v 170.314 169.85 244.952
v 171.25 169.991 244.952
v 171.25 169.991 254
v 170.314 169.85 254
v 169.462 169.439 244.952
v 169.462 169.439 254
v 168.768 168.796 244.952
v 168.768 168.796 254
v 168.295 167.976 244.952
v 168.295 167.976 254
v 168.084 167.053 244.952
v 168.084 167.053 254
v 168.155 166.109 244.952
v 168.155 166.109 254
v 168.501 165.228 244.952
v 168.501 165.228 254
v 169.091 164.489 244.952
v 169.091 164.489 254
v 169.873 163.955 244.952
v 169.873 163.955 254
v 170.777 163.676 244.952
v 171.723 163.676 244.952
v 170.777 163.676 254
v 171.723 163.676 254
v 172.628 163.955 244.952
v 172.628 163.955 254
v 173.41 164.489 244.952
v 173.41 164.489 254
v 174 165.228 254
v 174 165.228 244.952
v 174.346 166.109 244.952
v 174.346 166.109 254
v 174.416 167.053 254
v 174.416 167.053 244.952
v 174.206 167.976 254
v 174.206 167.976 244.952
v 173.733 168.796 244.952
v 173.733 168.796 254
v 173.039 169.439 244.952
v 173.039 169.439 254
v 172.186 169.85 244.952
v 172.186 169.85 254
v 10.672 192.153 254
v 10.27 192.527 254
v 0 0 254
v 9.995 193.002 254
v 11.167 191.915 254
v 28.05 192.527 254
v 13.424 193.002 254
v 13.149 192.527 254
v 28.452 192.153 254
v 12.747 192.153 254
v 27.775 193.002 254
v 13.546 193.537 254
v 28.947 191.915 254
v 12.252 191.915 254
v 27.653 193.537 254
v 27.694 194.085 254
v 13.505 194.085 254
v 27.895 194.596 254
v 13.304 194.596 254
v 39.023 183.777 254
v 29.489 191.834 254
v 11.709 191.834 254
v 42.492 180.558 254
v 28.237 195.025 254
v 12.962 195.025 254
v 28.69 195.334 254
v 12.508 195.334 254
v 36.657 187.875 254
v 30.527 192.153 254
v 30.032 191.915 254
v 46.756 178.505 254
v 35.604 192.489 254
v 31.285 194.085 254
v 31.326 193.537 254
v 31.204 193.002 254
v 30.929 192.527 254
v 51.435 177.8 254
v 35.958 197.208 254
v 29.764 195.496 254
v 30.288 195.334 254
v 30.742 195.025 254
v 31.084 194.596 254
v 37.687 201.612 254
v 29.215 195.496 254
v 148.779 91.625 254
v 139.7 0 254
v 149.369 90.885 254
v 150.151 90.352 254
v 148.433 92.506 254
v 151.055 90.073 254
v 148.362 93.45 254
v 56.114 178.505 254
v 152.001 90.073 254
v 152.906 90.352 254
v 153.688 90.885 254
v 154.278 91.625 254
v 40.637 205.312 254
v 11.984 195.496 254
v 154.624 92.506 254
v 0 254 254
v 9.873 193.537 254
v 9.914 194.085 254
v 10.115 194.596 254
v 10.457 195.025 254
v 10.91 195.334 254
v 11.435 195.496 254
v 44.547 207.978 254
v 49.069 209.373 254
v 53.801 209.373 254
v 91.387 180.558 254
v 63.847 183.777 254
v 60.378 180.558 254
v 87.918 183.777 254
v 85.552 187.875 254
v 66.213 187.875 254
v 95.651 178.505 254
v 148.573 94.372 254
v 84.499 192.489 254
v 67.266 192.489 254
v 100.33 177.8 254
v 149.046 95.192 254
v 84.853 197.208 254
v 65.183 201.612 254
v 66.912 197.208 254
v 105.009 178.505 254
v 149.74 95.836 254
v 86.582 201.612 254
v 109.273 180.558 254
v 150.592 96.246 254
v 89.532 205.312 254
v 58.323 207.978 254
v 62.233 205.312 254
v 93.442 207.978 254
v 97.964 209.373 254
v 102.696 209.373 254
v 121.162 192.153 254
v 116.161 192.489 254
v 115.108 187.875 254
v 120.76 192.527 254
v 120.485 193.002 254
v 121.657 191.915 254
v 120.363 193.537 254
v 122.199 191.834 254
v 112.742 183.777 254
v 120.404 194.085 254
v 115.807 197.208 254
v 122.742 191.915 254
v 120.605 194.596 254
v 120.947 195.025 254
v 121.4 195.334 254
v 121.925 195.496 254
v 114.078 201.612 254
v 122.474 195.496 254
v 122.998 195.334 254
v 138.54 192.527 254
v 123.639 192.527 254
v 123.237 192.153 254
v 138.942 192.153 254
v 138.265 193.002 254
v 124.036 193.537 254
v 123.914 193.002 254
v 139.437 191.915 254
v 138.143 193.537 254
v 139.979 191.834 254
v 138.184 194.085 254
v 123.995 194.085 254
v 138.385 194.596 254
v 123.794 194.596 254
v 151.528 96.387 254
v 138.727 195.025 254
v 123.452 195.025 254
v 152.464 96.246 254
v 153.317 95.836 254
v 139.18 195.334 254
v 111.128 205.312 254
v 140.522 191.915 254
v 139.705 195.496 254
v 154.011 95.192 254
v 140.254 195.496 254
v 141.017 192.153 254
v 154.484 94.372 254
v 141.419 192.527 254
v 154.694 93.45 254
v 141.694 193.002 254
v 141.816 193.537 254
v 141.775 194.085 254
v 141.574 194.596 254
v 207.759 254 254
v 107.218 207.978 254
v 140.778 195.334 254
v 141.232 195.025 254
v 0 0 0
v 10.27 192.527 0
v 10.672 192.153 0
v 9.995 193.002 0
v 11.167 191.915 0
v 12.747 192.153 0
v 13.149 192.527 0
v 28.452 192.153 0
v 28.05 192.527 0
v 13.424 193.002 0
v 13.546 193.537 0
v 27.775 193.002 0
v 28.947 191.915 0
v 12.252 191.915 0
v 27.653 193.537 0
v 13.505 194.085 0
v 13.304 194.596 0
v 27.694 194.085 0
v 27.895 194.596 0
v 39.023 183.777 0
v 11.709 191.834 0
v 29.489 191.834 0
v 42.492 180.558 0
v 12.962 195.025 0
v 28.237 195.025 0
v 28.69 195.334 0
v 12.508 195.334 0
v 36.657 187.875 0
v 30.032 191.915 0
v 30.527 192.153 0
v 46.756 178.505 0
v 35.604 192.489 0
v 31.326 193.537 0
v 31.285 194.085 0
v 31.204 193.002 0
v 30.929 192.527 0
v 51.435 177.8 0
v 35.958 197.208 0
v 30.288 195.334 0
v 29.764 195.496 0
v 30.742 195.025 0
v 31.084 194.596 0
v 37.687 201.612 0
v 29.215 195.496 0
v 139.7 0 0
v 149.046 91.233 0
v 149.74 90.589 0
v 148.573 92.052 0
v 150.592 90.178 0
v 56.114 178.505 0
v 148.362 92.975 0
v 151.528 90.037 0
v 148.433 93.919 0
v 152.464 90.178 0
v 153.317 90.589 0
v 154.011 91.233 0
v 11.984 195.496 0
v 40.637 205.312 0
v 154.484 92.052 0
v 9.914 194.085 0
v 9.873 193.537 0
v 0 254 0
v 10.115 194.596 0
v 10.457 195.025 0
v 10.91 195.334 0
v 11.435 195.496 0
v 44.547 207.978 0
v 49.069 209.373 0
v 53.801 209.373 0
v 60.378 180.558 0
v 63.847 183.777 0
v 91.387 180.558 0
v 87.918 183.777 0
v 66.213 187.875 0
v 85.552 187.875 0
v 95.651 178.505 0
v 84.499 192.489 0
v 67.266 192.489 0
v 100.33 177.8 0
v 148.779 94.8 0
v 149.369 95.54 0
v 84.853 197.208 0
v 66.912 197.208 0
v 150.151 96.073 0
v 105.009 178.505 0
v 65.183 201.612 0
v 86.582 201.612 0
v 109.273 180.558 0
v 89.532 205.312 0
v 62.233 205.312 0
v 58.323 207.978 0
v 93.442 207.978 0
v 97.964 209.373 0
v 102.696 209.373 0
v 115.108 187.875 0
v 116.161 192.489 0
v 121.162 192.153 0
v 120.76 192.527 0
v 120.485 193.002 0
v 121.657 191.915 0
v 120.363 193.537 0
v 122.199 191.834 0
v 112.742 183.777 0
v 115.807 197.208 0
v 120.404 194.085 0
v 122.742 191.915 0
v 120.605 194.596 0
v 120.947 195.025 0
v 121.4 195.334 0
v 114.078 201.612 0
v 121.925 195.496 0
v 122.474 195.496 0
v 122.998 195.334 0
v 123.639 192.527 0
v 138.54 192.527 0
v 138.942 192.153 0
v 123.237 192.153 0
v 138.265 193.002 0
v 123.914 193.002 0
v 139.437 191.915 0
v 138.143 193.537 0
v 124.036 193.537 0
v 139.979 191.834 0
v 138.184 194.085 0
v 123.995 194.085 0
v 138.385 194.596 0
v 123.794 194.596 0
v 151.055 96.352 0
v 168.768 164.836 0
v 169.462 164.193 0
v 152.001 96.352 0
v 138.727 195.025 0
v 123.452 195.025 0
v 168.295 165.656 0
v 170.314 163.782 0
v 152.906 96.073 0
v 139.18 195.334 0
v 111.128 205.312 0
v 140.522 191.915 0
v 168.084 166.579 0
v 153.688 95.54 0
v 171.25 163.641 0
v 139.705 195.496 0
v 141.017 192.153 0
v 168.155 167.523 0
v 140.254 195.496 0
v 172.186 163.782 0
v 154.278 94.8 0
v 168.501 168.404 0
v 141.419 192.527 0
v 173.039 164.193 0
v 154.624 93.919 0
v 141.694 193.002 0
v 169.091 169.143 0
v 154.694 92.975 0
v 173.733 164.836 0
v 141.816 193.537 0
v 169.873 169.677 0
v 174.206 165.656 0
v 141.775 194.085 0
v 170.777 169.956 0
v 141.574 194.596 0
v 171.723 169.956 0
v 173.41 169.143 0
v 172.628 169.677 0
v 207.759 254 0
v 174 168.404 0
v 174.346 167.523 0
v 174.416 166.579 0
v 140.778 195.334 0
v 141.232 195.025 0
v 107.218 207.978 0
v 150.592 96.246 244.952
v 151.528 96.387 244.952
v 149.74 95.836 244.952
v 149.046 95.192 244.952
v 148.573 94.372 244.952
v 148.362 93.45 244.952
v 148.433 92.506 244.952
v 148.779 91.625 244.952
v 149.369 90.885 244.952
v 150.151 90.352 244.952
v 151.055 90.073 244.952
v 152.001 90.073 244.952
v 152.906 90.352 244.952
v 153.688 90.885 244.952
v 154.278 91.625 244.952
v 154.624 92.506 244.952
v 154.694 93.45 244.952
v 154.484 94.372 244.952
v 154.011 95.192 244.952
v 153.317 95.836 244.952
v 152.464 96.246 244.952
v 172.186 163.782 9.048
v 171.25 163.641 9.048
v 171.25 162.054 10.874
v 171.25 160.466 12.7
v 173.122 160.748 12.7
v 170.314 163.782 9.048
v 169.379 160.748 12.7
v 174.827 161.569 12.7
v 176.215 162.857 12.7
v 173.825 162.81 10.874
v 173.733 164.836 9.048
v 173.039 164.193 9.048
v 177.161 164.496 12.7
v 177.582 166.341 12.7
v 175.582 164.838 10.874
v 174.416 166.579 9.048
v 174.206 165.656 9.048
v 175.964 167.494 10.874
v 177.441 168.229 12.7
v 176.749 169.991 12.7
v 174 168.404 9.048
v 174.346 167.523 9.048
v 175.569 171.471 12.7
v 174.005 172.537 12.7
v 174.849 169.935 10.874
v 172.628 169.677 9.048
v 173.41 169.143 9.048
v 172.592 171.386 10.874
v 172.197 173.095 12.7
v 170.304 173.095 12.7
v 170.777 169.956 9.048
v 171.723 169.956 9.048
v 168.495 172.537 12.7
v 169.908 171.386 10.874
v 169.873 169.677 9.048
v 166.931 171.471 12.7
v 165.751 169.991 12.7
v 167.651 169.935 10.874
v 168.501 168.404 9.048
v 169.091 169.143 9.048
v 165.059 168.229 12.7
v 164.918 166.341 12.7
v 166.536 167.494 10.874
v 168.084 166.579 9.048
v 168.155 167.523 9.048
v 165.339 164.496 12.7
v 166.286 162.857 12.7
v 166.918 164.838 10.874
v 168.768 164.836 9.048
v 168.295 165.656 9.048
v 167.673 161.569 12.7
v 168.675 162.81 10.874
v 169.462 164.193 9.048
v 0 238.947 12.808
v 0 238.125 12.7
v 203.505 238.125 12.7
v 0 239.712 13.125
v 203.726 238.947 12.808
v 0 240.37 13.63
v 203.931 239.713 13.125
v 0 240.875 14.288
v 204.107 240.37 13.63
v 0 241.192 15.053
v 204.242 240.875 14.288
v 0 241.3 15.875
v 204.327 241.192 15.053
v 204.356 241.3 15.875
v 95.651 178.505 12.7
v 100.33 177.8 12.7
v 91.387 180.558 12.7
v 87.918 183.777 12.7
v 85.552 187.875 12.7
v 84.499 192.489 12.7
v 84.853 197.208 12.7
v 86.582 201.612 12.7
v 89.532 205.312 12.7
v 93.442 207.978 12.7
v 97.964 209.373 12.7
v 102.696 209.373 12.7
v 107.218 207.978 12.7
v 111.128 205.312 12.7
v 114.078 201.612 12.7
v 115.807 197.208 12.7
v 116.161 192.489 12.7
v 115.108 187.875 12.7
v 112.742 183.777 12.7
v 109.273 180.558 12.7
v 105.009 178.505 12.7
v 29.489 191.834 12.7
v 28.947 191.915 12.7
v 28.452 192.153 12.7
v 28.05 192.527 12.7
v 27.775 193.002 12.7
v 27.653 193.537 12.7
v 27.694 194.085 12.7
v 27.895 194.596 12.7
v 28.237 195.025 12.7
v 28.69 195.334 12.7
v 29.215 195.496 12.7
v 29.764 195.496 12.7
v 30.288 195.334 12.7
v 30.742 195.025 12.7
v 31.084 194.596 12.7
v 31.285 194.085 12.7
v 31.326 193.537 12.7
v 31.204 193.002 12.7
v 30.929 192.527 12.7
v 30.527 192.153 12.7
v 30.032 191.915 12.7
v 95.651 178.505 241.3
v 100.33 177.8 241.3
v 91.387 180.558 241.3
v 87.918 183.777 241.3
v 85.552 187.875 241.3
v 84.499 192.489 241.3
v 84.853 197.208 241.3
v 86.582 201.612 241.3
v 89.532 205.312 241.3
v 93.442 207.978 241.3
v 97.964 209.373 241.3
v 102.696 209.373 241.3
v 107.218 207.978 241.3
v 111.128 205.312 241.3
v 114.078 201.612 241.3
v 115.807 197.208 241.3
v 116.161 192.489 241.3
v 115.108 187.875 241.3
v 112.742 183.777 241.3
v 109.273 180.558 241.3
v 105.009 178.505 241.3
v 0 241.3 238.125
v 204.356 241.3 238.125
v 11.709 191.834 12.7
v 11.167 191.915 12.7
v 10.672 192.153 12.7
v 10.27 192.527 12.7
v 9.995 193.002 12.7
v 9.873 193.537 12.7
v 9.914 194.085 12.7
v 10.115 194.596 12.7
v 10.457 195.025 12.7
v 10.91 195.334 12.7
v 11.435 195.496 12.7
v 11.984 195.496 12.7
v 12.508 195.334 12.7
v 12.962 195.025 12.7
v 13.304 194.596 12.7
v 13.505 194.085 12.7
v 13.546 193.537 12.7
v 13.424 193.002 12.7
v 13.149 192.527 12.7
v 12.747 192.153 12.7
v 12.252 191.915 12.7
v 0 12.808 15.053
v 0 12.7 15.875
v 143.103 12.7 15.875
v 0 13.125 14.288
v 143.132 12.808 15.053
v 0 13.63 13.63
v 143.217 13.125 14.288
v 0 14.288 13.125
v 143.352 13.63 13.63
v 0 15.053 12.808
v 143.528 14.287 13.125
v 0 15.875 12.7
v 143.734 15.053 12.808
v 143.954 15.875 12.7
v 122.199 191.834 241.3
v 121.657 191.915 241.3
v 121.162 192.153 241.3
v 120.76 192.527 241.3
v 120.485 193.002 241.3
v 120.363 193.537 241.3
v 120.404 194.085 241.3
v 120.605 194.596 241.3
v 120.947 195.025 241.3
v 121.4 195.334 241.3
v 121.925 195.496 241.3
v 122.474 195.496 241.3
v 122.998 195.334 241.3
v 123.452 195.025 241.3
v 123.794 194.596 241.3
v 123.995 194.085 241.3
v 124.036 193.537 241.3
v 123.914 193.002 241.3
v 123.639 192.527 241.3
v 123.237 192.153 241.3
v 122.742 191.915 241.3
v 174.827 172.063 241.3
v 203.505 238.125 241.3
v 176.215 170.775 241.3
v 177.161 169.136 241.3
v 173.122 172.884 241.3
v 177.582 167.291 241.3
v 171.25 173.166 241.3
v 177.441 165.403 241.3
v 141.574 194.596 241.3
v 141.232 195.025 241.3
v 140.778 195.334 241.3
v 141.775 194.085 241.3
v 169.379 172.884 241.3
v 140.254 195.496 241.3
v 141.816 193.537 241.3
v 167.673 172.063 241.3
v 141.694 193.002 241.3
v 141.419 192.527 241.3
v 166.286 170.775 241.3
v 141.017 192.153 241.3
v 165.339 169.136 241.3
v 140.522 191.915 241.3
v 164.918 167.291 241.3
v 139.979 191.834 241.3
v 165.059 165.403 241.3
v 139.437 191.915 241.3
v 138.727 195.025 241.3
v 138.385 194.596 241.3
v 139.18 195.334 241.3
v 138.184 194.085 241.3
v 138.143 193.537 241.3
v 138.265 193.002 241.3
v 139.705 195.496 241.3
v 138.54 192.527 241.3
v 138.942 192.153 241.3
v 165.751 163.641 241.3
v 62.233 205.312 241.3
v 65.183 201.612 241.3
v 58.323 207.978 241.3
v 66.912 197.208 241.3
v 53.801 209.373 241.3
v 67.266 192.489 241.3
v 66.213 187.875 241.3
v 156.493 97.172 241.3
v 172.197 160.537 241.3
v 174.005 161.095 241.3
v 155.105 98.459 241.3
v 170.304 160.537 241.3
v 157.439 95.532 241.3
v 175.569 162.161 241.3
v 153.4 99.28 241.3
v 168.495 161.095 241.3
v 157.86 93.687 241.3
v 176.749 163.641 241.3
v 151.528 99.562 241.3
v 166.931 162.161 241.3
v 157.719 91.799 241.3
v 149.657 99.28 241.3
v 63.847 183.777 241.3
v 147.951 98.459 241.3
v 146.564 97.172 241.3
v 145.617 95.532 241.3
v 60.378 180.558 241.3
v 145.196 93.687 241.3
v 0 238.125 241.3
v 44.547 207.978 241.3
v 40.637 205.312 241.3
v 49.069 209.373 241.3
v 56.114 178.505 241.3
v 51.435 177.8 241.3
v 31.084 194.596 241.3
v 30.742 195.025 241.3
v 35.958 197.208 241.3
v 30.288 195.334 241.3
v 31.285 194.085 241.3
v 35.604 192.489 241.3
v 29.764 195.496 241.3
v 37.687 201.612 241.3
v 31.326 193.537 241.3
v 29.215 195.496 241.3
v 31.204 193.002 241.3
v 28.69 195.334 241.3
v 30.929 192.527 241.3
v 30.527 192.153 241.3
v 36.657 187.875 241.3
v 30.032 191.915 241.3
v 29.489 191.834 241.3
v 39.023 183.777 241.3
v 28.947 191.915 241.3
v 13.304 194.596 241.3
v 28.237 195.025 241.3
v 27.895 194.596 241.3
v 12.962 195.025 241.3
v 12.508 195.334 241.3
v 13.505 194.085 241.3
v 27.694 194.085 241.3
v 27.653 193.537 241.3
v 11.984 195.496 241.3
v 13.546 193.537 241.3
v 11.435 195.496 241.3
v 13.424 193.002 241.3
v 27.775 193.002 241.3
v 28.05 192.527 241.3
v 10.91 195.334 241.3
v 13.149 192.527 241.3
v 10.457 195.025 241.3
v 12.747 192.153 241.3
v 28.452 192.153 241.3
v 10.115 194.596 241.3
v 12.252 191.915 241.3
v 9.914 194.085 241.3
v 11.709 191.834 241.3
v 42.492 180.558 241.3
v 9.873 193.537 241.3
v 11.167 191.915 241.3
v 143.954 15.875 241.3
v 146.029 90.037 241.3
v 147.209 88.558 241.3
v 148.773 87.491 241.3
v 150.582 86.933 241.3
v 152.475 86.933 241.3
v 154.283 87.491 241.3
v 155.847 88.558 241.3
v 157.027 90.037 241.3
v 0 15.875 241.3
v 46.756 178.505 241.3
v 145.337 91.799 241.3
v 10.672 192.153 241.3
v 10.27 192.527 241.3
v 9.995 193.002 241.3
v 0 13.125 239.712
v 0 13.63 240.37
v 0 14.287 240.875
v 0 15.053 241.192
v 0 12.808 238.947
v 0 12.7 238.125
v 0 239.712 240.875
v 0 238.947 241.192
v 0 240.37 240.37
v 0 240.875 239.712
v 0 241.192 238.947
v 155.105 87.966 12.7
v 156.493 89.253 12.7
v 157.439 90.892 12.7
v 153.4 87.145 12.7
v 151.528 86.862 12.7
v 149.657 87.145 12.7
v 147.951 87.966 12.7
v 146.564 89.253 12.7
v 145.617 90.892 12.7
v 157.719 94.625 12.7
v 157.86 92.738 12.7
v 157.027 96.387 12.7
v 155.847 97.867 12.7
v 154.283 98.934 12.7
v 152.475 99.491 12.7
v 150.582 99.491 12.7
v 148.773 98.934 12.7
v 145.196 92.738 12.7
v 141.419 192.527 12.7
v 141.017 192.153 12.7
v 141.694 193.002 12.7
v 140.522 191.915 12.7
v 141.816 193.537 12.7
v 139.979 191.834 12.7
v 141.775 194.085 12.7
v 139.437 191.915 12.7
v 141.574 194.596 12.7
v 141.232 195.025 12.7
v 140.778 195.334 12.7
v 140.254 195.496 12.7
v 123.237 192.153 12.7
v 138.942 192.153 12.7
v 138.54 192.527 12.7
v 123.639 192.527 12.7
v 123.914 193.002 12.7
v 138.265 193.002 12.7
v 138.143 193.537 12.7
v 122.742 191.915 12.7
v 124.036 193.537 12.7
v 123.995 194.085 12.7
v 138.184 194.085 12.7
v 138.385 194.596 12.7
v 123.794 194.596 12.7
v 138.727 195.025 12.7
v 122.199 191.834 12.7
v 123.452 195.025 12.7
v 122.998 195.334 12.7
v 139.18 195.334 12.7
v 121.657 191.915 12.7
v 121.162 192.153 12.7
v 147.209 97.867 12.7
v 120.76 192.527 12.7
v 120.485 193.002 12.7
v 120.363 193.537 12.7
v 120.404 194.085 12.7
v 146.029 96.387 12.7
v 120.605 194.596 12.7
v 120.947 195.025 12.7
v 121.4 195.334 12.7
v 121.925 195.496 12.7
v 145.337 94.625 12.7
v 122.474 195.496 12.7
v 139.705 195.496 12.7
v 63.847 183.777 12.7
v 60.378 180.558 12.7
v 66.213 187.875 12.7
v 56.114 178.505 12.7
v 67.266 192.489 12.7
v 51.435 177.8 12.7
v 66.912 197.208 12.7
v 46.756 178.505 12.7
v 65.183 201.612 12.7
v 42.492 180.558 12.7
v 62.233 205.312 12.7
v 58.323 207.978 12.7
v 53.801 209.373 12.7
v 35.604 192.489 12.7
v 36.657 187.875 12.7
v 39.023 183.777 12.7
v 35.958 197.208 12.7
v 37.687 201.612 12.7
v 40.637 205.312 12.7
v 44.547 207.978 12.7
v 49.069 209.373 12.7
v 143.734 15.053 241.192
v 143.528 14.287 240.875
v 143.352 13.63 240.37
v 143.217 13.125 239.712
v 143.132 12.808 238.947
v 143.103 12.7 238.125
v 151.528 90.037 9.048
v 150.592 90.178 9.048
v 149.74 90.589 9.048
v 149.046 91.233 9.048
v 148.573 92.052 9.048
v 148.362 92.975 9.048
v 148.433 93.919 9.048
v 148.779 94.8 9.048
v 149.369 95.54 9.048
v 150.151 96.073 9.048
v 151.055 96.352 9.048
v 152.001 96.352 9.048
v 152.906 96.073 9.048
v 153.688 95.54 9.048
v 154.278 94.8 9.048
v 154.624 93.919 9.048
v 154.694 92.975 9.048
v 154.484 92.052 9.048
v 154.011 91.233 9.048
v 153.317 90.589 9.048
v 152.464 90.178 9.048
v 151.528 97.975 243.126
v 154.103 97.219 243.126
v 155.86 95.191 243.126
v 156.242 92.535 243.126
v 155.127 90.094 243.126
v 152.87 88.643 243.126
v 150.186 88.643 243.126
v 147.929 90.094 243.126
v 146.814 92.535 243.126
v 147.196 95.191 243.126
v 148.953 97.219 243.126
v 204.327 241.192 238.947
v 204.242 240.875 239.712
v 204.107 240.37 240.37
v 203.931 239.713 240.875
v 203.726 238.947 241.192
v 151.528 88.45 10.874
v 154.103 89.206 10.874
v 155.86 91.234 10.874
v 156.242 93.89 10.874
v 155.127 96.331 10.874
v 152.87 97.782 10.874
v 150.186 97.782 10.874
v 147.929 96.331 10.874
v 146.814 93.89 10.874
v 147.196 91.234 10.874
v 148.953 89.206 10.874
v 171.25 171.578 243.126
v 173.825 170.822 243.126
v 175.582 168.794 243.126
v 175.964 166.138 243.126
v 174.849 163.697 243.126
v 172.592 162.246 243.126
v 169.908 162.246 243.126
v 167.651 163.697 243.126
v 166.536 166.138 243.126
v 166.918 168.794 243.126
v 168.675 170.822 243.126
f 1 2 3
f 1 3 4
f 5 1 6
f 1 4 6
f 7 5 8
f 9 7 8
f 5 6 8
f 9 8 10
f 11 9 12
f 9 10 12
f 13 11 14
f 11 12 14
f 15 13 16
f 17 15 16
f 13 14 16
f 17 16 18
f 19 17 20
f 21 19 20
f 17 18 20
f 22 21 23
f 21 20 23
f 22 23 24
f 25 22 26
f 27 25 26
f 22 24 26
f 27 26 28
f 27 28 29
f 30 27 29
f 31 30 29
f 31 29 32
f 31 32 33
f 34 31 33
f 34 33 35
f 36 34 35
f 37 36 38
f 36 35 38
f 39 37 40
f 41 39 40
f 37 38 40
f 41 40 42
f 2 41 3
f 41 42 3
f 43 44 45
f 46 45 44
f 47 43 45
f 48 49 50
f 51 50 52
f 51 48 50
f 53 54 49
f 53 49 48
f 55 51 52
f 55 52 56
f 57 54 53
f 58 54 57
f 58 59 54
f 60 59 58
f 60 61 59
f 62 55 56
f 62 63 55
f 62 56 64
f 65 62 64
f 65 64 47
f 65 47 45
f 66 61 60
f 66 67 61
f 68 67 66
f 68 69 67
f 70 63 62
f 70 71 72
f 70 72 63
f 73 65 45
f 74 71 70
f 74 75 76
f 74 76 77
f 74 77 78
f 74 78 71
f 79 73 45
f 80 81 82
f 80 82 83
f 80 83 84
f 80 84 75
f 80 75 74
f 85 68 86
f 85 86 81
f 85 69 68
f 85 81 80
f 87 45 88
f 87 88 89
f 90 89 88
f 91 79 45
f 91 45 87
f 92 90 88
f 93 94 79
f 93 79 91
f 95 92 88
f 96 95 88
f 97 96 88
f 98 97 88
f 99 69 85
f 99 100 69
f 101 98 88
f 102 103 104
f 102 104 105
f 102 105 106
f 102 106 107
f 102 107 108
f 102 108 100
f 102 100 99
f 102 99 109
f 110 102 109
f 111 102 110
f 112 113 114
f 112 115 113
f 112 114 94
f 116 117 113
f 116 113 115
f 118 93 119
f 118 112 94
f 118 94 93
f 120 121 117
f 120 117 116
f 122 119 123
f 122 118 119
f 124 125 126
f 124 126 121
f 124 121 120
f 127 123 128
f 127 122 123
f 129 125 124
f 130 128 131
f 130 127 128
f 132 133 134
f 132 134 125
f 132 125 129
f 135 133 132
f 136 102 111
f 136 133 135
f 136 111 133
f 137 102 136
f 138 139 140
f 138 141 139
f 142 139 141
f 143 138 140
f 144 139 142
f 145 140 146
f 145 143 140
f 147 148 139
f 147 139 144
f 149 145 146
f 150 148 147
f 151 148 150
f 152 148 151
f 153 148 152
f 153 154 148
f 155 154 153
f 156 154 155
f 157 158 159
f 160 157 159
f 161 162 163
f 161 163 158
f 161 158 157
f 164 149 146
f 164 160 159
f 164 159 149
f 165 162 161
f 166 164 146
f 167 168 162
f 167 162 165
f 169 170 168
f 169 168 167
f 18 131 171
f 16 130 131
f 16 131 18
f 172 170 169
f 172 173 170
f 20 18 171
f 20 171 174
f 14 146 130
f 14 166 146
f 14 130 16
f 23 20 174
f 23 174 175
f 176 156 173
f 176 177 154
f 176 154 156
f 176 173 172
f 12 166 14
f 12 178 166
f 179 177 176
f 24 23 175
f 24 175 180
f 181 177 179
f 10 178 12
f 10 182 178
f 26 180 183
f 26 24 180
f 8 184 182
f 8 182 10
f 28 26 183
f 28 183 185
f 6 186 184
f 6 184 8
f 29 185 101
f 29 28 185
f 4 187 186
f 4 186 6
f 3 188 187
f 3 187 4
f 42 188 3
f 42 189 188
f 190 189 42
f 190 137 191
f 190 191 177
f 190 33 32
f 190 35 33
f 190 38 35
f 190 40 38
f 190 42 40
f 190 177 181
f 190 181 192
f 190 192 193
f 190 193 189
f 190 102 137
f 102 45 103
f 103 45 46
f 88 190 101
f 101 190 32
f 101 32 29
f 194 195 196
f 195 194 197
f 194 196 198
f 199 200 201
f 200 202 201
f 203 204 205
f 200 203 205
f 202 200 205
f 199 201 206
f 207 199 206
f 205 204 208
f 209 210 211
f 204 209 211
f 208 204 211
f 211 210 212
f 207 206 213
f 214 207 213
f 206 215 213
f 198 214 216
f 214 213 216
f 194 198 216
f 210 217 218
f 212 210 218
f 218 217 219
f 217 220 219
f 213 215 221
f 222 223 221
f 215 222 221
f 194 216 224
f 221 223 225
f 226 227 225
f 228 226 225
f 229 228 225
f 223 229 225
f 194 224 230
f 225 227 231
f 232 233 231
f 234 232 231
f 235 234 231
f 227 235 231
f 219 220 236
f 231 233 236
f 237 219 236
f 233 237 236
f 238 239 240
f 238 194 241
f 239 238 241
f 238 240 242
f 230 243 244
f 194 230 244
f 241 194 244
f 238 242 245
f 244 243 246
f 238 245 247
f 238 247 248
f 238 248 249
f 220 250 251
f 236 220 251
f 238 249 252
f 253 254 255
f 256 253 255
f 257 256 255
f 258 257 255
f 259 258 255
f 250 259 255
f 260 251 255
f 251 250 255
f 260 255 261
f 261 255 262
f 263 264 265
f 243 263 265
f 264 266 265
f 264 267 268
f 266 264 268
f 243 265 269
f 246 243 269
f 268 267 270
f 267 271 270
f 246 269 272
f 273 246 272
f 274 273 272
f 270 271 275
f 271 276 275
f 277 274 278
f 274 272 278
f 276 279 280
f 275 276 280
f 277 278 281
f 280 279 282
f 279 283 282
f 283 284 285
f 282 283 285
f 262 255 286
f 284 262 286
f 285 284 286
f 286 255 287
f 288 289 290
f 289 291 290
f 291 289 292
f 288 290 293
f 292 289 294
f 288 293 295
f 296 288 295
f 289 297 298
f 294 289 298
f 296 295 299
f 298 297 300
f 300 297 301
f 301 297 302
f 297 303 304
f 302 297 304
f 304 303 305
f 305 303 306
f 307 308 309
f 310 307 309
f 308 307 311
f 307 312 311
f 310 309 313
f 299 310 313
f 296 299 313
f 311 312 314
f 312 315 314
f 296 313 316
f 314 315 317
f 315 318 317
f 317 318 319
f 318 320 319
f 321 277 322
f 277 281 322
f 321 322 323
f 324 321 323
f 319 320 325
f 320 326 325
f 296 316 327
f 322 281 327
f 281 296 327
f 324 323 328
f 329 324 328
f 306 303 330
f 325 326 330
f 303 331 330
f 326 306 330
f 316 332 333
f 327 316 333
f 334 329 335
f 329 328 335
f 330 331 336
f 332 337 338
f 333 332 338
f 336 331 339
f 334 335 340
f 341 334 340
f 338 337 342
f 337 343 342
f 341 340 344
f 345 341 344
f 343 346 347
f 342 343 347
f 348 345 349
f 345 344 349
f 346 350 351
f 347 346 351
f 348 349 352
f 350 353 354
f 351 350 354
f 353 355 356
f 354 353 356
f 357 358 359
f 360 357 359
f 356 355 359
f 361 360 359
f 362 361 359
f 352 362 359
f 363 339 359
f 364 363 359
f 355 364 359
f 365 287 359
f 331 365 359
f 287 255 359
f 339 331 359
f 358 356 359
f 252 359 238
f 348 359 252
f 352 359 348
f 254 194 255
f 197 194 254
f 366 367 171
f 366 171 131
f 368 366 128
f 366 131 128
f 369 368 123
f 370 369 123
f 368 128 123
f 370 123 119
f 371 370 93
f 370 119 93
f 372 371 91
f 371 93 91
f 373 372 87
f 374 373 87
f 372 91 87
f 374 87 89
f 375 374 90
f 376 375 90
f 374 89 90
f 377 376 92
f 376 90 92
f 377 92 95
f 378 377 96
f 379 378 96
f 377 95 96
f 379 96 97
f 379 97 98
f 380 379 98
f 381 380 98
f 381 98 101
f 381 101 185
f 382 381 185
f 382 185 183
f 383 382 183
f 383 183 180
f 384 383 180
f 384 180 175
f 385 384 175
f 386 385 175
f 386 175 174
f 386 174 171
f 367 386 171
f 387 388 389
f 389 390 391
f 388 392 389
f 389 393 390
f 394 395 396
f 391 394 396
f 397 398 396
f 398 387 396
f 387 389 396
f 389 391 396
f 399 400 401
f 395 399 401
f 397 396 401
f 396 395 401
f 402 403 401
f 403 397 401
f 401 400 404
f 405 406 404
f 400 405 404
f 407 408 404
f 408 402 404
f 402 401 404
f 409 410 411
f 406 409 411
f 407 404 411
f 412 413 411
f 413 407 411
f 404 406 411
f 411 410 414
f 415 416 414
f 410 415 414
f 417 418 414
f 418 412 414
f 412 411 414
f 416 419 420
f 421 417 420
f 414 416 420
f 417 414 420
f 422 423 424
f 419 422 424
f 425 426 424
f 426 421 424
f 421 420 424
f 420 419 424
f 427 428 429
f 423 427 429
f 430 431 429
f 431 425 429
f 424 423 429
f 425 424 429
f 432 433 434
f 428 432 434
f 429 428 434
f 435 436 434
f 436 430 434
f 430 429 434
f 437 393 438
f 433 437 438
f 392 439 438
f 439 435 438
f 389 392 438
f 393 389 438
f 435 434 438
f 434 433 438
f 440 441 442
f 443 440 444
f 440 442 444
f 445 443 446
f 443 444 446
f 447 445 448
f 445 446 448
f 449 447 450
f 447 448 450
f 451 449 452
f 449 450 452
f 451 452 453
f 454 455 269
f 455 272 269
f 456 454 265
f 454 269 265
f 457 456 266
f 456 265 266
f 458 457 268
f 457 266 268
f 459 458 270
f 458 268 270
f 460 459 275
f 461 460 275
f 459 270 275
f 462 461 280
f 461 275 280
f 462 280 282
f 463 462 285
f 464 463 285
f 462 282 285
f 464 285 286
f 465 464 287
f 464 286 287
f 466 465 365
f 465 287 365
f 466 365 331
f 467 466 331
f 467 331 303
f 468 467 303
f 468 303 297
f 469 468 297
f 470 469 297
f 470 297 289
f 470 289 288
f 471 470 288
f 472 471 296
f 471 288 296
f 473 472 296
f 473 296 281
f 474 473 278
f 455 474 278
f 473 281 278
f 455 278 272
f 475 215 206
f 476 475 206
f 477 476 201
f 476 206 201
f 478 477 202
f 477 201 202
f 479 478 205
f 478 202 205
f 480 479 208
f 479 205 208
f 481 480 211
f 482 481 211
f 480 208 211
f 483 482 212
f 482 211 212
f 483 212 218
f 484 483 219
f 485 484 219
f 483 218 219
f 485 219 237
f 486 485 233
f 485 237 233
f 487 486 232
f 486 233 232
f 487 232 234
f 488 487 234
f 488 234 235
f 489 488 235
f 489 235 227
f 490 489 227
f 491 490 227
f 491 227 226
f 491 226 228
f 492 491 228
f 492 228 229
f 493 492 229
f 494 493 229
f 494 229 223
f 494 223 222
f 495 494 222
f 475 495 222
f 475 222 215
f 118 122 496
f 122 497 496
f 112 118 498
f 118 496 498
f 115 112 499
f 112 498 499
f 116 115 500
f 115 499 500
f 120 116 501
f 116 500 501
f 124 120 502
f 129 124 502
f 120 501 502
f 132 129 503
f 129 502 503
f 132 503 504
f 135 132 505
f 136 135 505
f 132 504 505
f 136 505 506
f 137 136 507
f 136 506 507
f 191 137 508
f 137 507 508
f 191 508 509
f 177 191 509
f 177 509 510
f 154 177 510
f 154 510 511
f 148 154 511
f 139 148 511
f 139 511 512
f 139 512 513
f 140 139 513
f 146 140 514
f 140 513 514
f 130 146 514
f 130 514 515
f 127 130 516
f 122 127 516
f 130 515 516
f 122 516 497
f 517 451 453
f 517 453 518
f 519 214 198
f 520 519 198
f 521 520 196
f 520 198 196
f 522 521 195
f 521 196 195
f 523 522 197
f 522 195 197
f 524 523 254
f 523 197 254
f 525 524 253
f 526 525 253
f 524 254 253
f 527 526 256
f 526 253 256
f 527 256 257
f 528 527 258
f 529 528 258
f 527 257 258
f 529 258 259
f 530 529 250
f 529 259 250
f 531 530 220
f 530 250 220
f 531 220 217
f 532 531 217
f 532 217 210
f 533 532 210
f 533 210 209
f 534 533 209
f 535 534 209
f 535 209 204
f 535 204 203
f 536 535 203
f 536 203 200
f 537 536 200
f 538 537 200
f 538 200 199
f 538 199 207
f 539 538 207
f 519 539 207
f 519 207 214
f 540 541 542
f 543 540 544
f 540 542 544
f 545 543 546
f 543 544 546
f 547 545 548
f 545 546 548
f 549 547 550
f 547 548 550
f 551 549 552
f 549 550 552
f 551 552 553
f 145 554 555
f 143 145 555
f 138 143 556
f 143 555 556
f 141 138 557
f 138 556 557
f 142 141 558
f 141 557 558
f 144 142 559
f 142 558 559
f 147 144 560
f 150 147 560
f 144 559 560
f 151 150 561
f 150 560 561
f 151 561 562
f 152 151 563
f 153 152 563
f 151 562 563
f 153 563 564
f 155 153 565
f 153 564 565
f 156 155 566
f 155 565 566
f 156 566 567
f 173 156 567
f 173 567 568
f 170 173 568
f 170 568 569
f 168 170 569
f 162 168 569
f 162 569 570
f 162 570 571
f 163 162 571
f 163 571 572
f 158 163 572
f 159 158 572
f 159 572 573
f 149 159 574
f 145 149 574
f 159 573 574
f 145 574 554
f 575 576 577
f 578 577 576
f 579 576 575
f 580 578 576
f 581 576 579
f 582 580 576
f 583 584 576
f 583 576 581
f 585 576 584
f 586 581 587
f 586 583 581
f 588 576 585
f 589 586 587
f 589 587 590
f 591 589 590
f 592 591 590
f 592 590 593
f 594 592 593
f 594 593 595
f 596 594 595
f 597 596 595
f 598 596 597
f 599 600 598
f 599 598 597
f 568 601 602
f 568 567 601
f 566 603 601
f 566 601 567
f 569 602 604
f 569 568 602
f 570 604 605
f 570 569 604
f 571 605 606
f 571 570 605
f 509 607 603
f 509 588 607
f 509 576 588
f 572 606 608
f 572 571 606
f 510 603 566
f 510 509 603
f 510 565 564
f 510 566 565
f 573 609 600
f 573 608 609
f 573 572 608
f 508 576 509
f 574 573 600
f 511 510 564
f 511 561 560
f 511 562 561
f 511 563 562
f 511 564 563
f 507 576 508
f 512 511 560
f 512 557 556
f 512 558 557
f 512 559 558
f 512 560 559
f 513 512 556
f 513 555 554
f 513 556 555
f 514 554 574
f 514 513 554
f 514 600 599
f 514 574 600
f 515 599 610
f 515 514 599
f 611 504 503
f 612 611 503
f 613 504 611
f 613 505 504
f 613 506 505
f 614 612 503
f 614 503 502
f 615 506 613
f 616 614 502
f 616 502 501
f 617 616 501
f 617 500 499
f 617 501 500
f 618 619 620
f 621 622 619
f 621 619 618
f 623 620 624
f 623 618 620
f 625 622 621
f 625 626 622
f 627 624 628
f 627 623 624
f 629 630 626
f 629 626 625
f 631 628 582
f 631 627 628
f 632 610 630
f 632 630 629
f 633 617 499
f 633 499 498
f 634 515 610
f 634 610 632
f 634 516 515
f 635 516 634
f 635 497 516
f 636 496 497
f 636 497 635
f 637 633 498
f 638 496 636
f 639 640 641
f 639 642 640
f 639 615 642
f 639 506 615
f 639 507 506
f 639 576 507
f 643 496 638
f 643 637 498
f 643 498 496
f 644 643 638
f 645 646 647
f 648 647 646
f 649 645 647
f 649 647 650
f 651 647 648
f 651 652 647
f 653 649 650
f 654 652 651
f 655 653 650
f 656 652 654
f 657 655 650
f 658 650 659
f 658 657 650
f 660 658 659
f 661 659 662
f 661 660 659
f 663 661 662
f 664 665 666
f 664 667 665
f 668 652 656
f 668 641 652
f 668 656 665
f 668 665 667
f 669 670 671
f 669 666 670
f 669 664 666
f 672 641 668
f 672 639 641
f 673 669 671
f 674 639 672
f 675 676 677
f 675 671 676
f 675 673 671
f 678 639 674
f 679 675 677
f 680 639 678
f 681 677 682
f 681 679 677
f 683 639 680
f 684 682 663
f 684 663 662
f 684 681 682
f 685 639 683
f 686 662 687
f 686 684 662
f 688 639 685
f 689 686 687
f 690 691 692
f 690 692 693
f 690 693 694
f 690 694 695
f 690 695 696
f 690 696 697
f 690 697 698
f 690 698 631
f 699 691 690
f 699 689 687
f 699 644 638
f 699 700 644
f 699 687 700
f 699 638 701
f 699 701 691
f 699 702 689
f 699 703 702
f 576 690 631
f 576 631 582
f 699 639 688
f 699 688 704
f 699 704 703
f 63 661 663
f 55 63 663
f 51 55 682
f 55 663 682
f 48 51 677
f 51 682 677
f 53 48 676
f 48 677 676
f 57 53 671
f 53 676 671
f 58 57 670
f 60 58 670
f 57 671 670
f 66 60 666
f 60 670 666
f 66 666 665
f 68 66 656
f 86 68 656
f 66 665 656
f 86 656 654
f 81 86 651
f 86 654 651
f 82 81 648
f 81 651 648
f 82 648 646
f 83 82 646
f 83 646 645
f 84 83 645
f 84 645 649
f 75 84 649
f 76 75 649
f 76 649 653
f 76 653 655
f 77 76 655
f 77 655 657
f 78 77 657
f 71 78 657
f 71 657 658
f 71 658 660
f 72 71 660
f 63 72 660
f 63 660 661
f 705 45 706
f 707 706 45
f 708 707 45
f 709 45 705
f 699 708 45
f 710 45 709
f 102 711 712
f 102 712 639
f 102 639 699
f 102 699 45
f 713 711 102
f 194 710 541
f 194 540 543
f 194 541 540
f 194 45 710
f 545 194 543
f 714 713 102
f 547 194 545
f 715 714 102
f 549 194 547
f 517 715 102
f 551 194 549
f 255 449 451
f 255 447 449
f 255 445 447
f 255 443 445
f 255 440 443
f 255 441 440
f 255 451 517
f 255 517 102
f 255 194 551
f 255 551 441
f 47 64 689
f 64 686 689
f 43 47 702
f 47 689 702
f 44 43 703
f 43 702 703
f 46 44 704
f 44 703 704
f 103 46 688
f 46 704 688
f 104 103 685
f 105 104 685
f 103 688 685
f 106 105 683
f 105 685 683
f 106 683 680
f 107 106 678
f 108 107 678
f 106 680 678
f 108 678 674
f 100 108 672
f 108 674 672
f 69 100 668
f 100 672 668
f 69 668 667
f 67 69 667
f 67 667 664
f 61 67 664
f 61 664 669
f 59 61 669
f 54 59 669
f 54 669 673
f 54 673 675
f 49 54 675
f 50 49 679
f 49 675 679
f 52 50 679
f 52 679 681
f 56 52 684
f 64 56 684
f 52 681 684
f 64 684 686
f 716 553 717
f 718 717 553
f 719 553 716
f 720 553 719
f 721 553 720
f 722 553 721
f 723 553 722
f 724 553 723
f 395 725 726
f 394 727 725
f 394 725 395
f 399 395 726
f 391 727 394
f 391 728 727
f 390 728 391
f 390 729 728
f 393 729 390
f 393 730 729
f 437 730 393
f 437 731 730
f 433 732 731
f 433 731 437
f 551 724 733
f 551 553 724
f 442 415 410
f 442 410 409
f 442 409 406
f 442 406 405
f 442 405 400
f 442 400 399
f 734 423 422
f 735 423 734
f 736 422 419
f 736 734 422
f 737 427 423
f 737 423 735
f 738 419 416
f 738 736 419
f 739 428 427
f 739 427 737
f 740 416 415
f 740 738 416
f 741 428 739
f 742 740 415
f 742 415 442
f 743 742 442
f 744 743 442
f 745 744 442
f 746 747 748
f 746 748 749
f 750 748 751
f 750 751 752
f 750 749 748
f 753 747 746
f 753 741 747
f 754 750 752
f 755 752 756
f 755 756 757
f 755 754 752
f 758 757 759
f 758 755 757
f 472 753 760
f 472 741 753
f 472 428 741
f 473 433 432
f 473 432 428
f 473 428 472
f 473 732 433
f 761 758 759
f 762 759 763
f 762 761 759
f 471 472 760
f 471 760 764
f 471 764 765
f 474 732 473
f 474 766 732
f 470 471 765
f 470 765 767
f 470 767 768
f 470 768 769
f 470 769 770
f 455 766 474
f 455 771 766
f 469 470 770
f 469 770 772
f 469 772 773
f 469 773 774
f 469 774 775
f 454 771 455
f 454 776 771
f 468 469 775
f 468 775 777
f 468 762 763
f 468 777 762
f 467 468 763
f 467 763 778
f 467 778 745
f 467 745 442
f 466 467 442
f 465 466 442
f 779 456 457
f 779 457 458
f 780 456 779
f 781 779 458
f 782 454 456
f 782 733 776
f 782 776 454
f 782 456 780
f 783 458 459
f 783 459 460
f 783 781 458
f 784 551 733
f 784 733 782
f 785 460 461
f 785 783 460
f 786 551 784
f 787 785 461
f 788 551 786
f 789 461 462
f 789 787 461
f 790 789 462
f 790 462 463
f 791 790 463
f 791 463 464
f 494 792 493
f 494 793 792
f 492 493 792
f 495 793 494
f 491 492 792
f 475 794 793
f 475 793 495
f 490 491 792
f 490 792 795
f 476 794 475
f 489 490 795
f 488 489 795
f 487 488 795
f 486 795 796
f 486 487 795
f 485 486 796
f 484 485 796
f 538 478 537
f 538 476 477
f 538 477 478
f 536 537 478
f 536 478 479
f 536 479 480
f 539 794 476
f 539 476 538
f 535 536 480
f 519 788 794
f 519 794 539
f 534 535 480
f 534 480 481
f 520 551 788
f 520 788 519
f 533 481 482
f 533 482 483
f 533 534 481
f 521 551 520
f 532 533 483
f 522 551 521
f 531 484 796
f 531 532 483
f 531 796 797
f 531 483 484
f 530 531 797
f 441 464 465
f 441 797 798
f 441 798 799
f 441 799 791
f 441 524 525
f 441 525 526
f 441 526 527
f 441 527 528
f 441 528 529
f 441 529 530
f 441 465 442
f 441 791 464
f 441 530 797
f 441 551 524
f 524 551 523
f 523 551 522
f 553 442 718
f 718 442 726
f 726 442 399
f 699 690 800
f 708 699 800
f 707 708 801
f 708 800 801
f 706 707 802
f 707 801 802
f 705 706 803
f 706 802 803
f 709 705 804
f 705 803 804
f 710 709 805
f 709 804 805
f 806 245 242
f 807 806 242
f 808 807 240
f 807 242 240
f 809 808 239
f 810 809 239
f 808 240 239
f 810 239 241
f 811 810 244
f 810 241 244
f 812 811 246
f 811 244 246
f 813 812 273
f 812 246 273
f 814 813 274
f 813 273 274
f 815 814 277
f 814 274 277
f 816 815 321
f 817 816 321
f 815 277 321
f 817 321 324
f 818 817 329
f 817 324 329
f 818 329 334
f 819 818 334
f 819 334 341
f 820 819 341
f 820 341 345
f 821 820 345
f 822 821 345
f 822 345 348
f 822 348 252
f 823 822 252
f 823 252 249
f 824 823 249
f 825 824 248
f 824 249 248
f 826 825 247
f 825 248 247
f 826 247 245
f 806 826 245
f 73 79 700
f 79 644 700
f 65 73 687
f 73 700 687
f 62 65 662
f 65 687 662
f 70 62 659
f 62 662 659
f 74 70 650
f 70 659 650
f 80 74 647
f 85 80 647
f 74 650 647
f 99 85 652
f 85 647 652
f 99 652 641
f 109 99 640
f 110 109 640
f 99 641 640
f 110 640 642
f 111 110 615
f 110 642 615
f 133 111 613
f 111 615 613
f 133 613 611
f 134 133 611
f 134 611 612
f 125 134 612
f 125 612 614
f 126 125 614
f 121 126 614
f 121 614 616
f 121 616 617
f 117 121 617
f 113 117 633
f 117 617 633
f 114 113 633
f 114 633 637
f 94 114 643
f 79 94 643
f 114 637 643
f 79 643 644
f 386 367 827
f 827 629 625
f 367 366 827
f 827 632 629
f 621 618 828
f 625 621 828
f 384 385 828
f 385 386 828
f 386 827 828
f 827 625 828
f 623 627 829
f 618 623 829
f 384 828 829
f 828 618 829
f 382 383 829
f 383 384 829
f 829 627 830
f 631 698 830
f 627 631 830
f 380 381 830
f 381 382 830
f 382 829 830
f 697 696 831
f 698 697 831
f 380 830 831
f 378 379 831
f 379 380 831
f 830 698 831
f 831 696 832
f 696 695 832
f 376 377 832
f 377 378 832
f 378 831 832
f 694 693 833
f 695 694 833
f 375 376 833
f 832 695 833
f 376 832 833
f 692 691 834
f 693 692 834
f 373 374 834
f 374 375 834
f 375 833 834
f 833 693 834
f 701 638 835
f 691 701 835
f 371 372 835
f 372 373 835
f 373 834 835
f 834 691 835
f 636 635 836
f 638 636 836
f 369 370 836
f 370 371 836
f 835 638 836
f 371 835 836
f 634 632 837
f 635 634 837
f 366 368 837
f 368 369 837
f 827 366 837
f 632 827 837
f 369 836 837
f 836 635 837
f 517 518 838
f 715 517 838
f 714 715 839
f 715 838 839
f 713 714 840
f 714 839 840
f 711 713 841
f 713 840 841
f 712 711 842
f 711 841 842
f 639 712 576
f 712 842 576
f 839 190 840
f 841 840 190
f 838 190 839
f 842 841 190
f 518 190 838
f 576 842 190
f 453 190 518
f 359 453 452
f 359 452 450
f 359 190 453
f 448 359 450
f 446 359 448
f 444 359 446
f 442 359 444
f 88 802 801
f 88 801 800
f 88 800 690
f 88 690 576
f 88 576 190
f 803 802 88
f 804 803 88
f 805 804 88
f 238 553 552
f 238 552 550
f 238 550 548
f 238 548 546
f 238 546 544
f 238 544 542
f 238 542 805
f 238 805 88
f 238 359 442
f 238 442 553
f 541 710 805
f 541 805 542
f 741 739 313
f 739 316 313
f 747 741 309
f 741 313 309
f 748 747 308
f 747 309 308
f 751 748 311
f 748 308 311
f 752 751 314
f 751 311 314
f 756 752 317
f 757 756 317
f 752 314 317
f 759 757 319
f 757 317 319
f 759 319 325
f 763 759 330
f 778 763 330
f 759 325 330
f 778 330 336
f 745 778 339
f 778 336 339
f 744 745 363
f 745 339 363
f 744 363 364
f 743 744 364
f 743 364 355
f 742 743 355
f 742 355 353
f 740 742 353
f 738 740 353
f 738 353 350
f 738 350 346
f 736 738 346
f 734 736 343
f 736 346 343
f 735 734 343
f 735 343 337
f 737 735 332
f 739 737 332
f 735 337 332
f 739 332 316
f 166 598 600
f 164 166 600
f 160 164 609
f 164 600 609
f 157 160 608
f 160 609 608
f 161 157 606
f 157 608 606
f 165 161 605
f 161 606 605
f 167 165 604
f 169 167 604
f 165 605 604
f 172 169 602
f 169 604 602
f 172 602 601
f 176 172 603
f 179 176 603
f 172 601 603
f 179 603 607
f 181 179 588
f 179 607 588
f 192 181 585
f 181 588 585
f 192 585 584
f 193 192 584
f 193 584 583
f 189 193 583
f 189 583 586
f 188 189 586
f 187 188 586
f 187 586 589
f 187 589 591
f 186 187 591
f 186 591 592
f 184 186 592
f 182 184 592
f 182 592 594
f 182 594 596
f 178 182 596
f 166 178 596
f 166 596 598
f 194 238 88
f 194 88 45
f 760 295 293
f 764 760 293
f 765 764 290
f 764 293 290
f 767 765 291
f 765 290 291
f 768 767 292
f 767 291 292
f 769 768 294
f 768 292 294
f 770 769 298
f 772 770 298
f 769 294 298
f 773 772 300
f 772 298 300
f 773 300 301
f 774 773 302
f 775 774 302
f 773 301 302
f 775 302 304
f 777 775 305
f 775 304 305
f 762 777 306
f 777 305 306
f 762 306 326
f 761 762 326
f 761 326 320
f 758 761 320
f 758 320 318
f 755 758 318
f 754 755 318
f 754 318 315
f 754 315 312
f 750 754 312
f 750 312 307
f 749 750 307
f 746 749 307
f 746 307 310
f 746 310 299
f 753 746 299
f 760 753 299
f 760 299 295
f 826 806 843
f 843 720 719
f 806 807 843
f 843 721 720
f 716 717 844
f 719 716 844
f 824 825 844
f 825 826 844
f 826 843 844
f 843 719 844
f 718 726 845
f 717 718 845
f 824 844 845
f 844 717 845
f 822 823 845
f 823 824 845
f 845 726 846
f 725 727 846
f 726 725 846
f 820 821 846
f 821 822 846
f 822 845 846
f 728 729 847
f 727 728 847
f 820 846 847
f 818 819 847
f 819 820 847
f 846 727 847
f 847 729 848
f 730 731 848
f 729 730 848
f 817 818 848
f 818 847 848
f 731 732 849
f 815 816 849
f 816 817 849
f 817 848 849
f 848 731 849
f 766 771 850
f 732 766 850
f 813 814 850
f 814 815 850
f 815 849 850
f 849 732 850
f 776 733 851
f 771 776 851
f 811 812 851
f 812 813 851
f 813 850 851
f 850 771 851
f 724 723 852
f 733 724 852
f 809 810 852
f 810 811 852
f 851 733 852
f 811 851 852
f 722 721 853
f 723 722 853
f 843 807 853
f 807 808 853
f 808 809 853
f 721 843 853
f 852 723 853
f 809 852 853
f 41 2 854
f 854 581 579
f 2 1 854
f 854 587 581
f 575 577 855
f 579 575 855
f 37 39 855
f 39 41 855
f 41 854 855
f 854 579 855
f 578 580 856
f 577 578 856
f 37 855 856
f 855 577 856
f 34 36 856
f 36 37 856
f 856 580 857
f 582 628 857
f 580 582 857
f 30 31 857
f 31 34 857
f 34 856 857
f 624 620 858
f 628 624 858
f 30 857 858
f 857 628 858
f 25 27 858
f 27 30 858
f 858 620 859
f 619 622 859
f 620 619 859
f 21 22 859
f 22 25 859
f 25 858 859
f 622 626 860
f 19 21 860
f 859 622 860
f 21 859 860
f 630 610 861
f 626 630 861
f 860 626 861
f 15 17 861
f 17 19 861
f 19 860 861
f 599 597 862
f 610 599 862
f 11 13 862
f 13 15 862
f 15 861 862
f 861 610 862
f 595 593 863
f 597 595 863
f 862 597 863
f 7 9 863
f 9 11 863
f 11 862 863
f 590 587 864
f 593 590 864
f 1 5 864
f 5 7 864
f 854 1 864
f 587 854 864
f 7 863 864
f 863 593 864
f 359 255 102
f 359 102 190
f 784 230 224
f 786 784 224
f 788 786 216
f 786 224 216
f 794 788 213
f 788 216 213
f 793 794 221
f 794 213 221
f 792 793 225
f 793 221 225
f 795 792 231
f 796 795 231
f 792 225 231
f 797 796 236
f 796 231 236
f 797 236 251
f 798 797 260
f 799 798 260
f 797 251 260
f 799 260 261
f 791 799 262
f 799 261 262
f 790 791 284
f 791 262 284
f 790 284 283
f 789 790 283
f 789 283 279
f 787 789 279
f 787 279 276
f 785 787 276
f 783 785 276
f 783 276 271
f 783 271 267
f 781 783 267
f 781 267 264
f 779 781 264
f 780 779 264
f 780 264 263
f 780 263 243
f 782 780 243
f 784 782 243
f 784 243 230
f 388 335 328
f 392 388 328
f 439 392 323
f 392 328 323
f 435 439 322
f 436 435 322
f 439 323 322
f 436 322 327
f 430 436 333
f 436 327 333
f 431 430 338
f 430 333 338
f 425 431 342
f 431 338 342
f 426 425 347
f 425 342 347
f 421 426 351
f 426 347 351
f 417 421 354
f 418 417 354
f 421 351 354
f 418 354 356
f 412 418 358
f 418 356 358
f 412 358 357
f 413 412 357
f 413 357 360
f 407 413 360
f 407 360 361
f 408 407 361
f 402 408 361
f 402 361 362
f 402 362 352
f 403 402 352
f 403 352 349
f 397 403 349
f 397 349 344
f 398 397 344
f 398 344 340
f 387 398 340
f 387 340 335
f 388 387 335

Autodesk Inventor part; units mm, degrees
ref_plane "YZ Plane" through (0, 0, 0) normal (1, 0, 0) x (0, 1, 0)
ref_plane "XZ Plane" through (0, 0, 0) normal (0, 1, 0) x (-1, 0, 0)
ref_plane "XY Plane" through (0, 0, 0) normal (0, 0, 1) x (1, 0, 0)
sketch "Sketch1" plane through (0, 0, 0) normal (0, 0, 1) x (1, 0, 0)
  line L0 (0, 0) -> (0, 254)
  line L1 (0, 254) -> (207.7591, 254)
  line L2 (207.7591, 254) -> (139.7, 0)
  line L3 (139.7, 0) -> (0, 0)
  dimension "d0" = 254
  dimension "d2" = 139.7
  dimension "d24" = 75
extrude "Extrusion1" add sketch "Sketch1" along normal blind 254
sketch "Sketch2" plane through (0, 0, 0) normal (-1, 0, 0) x (0, 0, 1)
  line L0 (254, 0) -> (254, 254) projected
  line L1 (0, 254) -> (254, 254) projected
  line L2 (0, 0) -> (0, 254) projected
  line L3 (0, 0) -> (254, 0) projected
  line L4 (241.3, 241.3) -> (241.3, 12.7)
  line L5 (241.3, 12.7) -> (12.7, 12.7)
  line L6 (12.7, 12.7) -> (12.7, 241.3)
  line L7 (12.7, 241.3) -> (241.3, 241.3)
  dimension "d5" = 12.7
extrude "Extrusion2" cut sketch "Sketch2" against normal blind 209.55 contours L4 L5 L6 L7
sketch "Sketch6" plane through (0, 12.7, 241.3) normal (0, 0, -1) x (-1, 0, 0)
  line L0 (-143.103, 0) -> (-204.3561, 228.6) projected
  line L1 (0, 241.3) -> (-207.7591, 241.3) projected
  line L2 (-207.7591, 241.3) -> (-191.6487, 245.6168)
  point P0 (0, -12.7)
  point P1 (-139.7, -12.7)
  point P2 (-171.2502, 154.116)
  point P3 (-151.5282, 80.5124)
  point P4 (-203.2, 224.2852)
  dimension "d73" = 93.6625
  dimension "d74" = 169.8625
  dimension "d75" = 12.7
  dimension "d76" = 12.7
sketch "Sketch7" plane through (0, 12.7, 12.7) normal (0, 0, 1) x (1, 0, 0)
  point P0 (0, -12.7)
  point P1 (171.2502, 154.116)
  point P2 (151.5282, 80.5124)
hole "Hole1" at (51.435, 193.675, 254) direction (0, 0, -1) diameter 31.75 end through all
hole "Hole2" at (171.2502, 166.816, 12.7) direction (0, 0, -1) diameter 6.35 depth 25.4 tip angle 118 countersink diameter 12.7 countersink angle 82
hole "Hole3" at (151.5282, 93.2124, 12.7) direction (0, 0, -1) diameter 6.35 depth 25.4 tip angle 118 countersink diameter 12.7 countersink angle 82
hole "Hole4" at (171.2502, 166.816, 241.3) direction (0, 0, 1) diameter 6.35 depth 25.4 tip angle 118 countersink diameter 12.7 countersink angle 82
hole "Hole5" at (151.5282, 93.2124, 241.3) direction (0, 0, 1) diameter 6.35 depth 25.4 tip angle 118 countersink diameter 12.7 countersink angle 82
fillet "Fillet1" radius 3.175 4 edges at (102.1781, 241.3, 12.7) (102.1781, 241.3, 241.3) (71.5515, 12.7, 241.3) (71.5515, 12.7, 12.7)
pattern_linear "Rectangular Pattern2" count 2 spacing 48.895 along (1, 0, 0) of "Hole1"
hole "Hole6" at (29.4894, 193.675, 254) direction (0, 0, -1) diameter 3.683 end through all thread size "10-24 UNC" class "2B" standard "ANSI Unified Screw Threads"
pattern_linear "Rectangular Pattern3" count 2 spacing 17.78 along (-1, 0, 0) of "Hole6"
pattern_linear "Rectangular Pattern4" count 2 spacing 110.49 along (1, 0, 0) of "Hole6", "Rectangular Pattern3"
equation "\"d76\" = d75"
properties part number "GE-12059"
